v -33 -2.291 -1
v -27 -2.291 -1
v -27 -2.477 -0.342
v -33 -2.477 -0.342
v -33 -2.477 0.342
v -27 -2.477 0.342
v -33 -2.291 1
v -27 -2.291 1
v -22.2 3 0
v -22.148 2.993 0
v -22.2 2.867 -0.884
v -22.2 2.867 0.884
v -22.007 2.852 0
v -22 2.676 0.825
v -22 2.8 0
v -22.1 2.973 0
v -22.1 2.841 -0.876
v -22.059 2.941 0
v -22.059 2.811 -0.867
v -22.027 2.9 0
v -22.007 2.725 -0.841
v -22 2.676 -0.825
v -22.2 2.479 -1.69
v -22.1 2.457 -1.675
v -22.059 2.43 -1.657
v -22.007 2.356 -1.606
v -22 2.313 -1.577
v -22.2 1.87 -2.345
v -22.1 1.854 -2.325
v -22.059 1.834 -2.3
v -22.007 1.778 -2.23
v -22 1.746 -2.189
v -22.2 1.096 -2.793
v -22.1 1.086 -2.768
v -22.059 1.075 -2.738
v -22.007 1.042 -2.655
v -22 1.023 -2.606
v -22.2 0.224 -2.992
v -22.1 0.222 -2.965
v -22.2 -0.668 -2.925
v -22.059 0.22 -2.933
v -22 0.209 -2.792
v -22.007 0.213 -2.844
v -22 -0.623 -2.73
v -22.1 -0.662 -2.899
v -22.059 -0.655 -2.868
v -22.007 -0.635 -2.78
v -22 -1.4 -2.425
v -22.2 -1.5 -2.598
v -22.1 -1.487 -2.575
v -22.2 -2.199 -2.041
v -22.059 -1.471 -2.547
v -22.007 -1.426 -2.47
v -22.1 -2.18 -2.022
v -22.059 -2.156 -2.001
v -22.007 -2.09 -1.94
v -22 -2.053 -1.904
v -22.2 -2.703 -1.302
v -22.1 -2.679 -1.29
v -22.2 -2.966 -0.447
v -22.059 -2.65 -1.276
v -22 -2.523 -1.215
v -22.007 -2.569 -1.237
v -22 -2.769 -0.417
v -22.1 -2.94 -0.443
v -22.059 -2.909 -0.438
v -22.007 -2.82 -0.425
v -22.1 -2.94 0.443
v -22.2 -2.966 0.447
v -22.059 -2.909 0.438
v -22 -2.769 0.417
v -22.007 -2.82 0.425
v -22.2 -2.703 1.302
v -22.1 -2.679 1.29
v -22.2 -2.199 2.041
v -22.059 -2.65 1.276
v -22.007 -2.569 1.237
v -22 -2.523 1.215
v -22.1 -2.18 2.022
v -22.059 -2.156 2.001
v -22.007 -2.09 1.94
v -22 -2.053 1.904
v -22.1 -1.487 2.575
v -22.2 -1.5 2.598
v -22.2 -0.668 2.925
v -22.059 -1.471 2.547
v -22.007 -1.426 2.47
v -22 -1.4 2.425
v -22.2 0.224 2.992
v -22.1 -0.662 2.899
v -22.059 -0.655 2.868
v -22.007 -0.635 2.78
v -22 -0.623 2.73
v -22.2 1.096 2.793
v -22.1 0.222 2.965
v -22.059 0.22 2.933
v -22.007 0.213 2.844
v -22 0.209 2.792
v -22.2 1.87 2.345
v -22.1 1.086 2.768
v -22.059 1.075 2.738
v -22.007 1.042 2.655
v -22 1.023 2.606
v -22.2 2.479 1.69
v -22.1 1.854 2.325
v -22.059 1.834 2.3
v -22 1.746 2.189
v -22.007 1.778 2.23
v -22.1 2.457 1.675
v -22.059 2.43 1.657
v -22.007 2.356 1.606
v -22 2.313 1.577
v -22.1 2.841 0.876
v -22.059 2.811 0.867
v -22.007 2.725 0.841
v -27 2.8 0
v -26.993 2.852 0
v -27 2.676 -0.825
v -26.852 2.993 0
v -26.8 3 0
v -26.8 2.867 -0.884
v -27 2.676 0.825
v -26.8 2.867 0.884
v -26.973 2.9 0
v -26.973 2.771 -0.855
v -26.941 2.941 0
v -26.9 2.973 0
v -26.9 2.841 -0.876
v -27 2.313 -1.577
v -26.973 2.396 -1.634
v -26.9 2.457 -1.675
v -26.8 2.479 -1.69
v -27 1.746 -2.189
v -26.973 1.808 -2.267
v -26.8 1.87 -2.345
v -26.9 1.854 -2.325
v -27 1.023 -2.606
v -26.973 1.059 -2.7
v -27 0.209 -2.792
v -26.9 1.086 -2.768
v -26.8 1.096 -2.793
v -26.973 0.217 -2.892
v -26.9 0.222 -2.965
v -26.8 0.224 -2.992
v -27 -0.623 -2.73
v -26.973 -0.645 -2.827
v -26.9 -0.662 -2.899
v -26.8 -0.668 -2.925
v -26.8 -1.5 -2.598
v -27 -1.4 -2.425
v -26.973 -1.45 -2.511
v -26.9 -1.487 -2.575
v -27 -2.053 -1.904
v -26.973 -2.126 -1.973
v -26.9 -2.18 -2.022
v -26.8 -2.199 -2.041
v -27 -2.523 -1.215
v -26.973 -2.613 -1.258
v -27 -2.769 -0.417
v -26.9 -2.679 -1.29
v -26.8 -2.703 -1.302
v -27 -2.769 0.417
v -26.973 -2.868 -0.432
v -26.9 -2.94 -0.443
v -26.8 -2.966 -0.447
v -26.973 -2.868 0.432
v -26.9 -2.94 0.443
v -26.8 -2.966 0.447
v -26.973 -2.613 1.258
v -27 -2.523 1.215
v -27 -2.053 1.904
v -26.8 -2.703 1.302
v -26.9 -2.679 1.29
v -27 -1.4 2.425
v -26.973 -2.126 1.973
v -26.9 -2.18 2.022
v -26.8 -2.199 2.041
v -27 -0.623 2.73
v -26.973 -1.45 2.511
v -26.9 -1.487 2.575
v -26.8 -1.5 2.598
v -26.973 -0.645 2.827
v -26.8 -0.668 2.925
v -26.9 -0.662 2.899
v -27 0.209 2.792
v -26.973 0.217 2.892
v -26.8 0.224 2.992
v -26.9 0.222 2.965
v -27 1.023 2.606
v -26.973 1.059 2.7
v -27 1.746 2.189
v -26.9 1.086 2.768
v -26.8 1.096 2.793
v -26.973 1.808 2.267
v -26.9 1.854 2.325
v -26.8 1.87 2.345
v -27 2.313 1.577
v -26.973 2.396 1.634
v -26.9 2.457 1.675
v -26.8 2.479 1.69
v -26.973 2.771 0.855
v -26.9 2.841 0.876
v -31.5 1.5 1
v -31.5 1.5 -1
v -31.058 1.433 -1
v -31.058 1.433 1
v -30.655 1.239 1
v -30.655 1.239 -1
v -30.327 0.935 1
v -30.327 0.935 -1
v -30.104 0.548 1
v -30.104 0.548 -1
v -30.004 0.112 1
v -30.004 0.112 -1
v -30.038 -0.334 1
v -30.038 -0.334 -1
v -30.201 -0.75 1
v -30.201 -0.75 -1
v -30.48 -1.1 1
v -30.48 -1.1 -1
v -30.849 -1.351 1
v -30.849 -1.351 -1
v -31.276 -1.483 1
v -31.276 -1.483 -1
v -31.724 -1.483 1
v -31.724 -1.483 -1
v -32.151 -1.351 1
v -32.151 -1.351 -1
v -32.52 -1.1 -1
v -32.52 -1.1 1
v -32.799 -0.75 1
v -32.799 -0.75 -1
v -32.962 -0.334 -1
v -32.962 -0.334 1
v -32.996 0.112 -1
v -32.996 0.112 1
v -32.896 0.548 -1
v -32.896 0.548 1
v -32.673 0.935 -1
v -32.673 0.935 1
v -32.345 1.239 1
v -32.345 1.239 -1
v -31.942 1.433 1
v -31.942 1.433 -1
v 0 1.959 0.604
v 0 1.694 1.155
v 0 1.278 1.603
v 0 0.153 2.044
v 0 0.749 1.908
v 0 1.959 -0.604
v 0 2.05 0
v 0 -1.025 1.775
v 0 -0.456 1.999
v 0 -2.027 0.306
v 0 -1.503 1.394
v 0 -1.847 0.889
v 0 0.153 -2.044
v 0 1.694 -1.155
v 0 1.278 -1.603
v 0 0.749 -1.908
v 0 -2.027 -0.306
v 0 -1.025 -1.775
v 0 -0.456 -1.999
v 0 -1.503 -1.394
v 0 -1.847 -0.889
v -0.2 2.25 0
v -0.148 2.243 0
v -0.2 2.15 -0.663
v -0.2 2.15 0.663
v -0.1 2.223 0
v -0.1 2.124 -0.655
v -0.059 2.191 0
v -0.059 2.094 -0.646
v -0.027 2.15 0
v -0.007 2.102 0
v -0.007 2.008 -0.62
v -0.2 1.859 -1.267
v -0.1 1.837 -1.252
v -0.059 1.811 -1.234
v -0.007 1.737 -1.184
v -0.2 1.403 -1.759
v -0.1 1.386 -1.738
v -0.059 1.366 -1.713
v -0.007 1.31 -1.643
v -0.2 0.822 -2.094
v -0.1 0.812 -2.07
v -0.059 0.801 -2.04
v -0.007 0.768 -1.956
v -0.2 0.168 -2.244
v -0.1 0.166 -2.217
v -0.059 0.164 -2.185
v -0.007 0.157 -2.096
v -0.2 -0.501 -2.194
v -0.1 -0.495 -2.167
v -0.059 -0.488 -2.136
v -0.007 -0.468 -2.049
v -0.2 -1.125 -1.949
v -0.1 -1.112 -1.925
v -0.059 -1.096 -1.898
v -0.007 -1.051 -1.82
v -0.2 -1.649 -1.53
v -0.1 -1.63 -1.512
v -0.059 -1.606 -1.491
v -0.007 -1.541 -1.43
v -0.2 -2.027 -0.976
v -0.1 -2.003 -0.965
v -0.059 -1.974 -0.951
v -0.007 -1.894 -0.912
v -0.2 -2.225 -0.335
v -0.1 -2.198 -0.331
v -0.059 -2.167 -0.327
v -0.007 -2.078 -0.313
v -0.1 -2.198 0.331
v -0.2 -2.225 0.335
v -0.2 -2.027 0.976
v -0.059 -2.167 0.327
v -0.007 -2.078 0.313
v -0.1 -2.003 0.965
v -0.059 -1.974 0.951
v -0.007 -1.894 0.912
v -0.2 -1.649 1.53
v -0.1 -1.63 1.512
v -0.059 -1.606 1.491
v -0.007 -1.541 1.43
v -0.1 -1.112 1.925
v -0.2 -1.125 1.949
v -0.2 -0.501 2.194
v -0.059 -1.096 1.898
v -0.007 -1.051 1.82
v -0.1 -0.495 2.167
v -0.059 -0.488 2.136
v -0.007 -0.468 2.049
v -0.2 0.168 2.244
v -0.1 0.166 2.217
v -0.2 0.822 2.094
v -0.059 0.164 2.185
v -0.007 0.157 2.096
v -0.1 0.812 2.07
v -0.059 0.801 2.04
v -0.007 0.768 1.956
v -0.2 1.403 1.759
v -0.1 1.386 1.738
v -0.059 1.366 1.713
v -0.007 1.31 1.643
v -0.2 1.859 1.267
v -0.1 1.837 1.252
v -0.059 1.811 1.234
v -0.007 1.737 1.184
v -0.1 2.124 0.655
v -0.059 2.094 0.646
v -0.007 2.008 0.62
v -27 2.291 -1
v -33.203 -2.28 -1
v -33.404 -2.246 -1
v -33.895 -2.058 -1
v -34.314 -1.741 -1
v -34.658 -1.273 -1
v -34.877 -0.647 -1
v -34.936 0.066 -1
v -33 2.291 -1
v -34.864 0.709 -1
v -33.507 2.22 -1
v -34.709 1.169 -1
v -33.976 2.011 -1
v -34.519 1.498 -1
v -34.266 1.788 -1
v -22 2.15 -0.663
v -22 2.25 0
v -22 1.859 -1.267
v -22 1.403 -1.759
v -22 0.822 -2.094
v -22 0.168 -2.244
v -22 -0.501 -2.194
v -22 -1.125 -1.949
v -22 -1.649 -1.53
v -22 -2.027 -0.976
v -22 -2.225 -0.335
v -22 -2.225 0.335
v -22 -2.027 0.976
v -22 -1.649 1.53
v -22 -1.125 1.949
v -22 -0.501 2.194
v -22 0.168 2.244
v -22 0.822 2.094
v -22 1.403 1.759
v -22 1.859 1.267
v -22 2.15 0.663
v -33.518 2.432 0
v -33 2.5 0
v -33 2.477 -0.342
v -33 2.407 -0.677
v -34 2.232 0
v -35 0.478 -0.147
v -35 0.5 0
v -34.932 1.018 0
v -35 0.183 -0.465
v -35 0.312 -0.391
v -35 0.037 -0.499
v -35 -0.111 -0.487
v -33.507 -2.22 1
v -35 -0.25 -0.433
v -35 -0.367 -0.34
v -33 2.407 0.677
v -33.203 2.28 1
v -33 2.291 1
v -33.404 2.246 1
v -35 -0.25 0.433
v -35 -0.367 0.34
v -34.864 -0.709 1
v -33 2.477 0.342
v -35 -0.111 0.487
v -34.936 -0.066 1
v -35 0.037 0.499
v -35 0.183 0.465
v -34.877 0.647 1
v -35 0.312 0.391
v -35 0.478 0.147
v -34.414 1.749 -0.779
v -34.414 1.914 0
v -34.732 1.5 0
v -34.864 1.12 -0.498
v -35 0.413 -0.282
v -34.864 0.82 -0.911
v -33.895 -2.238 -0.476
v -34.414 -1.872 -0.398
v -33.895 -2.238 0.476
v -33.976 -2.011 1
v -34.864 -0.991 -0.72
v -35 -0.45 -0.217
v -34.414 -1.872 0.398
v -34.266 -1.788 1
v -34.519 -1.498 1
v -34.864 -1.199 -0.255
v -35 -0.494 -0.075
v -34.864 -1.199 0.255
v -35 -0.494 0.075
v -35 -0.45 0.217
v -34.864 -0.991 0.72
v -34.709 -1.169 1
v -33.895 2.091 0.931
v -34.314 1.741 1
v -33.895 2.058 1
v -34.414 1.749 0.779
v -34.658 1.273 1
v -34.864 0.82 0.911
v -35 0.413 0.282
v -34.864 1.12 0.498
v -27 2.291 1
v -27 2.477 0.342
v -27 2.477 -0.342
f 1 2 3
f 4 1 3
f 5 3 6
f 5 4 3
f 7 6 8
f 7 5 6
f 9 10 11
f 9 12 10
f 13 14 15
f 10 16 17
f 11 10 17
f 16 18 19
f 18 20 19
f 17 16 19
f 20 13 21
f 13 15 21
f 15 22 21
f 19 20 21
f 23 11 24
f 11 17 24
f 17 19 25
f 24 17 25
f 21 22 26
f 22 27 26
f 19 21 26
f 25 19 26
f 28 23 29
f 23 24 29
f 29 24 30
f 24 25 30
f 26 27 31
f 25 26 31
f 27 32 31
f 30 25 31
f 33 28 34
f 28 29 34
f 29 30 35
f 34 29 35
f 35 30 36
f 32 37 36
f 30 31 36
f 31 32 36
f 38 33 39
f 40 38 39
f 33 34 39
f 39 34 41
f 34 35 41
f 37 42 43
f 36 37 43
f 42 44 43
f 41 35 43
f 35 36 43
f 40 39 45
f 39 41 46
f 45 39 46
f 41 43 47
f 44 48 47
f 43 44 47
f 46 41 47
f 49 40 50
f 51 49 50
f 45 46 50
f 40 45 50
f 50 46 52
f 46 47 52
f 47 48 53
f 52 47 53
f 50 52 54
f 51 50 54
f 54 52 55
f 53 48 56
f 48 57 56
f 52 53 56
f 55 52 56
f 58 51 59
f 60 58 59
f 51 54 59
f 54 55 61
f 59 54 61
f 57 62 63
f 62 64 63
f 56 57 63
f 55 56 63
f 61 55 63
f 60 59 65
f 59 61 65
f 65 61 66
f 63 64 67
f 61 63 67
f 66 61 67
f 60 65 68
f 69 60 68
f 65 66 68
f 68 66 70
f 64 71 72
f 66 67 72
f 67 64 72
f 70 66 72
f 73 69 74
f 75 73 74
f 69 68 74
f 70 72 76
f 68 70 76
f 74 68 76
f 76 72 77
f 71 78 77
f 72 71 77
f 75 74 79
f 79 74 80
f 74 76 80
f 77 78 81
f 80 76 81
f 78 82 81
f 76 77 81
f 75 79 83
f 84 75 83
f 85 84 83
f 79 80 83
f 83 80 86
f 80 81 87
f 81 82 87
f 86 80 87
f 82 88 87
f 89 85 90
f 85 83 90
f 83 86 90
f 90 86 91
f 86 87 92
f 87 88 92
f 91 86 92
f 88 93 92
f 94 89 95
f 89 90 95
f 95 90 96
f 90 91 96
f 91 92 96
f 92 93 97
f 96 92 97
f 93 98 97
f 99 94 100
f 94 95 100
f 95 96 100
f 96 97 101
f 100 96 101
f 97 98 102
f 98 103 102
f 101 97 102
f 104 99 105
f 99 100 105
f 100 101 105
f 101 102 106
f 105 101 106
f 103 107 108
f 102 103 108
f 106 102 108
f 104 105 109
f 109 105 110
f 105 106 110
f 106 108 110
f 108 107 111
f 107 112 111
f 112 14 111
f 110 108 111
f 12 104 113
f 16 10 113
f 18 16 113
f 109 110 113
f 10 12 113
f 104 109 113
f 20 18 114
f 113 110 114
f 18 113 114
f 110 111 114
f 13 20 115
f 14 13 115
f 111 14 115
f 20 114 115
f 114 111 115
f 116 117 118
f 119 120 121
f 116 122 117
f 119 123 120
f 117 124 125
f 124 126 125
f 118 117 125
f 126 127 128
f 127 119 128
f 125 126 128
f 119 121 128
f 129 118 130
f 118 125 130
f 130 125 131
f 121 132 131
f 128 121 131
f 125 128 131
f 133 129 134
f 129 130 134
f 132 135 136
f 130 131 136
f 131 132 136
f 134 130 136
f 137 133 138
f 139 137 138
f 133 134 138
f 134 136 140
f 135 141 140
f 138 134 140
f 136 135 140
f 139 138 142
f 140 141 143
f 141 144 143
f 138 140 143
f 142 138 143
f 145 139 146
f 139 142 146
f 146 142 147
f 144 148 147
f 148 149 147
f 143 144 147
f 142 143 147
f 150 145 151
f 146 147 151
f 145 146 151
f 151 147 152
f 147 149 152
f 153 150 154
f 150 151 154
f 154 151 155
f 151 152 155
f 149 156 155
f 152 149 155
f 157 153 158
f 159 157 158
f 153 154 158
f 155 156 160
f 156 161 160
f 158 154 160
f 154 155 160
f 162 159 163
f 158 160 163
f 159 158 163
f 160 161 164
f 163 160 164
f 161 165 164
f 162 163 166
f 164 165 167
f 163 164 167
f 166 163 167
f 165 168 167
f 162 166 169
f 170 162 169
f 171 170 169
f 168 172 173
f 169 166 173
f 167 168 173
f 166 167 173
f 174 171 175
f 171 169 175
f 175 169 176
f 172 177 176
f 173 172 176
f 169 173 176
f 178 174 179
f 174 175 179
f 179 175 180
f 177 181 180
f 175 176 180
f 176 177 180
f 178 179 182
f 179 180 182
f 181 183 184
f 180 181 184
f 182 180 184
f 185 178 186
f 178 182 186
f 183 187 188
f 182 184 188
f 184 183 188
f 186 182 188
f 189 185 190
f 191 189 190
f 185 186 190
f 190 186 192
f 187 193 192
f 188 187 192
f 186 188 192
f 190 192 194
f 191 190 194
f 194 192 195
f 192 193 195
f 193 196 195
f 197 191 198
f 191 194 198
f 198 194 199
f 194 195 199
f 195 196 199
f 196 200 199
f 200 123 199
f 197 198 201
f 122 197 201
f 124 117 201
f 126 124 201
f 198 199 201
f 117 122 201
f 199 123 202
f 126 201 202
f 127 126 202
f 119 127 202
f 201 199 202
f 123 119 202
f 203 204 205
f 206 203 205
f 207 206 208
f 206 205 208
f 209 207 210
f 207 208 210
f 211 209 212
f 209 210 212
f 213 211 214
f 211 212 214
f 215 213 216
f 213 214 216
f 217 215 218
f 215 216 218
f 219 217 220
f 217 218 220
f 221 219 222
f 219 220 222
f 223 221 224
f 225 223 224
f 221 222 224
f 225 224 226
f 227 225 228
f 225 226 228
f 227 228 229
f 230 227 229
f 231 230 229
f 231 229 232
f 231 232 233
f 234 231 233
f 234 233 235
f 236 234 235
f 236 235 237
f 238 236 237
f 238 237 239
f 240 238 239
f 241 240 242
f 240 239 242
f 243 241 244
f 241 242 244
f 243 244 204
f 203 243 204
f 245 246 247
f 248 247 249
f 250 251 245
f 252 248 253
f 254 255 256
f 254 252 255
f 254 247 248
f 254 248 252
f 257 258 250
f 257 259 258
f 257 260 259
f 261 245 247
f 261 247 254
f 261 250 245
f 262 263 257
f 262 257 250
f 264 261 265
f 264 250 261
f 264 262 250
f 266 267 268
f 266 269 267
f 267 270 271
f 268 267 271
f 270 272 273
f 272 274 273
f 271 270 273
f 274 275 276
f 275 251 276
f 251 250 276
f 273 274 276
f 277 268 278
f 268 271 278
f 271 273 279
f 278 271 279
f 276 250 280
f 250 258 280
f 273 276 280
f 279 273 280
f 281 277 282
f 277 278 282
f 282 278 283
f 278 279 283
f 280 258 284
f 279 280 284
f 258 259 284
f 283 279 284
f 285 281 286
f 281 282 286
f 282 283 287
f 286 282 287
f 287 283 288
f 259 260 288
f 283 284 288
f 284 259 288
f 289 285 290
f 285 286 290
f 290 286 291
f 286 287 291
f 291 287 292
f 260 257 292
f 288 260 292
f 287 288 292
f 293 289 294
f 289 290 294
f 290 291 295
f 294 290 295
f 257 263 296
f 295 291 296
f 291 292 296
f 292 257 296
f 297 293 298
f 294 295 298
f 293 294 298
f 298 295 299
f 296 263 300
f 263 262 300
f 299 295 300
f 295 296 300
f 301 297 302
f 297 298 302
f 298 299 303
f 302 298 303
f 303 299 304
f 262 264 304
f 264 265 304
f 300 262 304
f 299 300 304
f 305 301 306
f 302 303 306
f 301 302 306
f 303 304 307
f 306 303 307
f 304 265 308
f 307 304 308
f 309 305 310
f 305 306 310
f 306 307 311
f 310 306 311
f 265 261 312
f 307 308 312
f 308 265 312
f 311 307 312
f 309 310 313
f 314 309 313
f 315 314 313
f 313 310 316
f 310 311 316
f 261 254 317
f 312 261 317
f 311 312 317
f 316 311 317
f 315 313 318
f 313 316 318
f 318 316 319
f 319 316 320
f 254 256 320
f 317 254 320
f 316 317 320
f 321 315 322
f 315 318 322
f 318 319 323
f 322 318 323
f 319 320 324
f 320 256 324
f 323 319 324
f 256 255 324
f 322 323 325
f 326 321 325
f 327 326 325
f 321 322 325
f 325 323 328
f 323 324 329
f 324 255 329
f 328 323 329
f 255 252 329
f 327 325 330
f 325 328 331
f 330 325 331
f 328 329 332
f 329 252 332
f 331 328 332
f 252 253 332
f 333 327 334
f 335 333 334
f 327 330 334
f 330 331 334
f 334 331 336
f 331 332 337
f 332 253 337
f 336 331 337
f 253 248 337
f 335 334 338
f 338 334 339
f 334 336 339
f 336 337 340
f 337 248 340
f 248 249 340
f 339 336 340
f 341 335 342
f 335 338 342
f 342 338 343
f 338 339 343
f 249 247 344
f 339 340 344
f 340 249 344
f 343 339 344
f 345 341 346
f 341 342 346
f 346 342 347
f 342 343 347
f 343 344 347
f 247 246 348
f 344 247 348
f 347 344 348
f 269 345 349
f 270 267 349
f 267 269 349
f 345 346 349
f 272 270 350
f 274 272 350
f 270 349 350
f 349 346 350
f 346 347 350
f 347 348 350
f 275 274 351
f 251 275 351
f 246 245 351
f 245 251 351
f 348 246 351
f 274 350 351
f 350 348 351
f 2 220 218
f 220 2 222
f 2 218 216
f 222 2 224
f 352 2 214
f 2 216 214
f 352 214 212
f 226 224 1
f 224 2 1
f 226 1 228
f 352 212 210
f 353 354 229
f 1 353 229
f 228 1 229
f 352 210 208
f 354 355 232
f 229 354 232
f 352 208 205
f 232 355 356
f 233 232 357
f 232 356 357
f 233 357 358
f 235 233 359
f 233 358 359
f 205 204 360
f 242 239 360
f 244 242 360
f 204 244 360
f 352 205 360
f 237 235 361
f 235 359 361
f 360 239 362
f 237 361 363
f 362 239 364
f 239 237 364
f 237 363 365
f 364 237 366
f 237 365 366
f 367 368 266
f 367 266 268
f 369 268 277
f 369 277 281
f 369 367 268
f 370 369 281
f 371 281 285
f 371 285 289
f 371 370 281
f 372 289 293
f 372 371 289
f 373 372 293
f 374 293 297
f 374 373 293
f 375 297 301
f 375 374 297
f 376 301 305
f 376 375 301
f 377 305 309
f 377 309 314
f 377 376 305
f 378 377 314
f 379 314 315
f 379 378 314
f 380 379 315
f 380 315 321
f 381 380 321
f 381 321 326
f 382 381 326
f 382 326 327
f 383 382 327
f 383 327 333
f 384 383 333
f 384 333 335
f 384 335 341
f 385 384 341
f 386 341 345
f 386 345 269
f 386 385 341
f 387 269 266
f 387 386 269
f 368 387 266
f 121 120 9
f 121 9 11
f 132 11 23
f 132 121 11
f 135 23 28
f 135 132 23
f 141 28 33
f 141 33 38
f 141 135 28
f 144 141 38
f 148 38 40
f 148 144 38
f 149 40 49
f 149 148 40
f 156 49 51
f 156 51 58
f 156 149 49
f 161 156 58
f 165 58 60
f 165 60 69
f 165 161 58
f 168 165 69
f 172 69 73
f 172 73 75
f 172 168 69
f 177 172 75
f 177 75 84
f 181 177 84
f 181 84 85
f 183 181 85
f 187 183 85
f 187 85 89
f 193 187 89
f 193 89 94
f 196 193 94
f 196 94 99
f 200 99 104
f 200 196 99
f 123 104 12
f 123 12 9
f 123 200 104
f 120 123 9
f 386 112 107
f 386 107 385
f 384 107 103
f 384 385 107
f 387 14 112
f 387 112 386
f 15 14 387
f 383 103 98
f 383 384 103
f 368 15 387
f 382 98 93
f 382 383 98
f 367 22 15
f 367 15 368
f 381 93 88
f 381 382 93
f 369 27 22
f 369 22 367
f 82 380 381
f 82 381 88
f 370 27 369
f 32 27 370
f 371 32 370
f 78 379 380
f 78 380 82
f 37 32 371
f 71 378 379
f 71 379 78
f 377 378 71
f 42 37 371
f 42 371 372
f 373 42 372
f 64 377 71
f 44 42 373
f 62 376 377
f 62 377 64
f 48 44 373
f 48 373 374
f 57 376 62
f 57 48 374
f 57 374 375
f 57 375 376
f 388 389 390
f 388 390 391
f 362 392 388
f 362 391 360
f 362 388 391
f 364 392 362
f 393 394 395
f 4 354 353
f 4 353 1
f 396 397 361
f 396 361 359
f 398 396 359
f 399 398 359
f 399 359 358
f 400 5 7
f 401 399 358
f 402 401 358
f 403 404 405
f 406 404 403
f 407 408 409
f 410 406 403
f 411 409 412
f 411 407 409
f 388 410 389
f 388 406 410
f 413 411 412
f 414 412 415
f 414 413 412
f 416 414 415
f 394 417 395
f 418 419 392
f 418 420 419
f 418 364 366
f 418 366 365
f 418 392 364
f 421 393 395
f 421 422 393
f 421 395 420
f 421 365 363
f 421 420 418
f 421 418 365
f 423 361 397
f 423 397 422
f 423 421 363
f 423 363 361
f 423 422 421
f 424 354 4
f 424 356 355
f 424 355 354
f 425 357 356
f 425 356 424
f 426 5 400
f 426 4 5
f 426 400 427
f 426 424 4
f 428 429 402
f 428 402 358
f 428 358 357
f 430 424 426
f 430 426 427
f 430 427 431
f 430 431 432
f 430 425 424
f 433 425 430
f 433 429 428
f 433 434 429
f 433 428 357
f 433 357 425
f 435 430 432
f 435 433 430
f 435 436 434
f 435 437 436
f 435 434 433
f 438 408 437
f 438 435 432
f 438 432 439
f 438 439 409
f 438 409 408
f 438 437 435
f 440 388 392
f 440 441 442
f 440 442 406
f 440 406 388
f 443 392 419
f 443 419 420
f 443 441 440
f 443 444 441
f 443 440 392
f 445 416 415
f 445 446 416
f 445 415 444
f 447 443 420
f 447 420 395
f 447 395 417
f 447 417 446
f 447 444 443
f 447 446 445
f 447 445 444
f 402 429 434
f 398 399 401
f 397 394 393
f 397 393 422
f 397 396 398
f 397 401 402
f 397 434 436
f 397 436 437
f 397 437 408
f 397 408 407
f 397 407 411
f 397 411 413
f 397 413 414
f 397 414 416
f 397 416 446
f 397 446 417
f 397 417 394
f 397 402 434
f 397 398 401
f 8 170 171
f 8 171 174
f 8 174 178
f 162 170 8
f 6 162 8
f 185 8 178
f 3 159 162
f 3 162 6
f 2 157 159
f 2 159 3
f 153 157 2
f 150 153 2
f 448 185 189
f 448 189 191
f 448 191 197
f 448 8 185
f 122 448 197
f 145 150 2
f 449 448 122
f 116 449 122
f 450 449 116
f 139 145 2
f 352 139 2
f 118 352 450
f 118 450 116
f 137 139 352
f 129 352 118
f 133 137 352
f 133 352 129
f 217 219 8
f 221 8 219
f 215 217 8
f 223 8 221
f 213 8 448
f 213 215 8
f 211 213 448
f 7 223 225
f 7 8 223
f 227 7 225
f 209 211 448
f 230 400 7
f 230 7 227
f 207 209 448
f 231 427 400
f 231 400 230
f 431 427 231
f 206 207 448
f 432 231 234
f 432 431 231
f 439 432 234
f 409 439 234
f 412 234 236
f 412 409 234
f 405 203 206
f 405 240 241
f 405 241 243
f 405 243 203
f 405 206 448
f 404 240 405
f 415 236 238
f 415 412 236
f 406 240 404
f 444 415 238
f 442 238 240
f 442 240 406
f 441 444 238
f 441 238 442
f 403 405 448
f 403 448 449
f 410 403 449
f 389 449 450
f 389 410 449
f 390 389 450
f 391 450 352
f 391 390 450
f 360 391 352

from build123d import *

# Parameters (mm, degrees)
FILLET_1_R          = 2
SKETCH_2_R          = 7.321356554
SKETCH_2_W          = 2
SKETCH_2_H          = 11.961651185
CUT_EXTRUDE_1_DEPTH = 8
SKETCH_3_R          = 1.5
CUT_EXTRUDE_2_DEPTH = 2
FILLET_2_R          = 0.2


with BuildPart() as part:
    # 草图1 → 旋转1 (revolve)
    with BuildSketch(Plane.XY):
        Polygon((0, 0), (0, 2.25), (-22, 2.25), (-22, 3), (-27, 3), (-27, 2.5), (-35, 2.5), (-35, 0), align=None)
    revolve(axis=Axis((0, 0, 0), (-1, 0, 0)))

    # 圆角1
    fillet_1_edges = [part.edges().sort_by_distance(p)[0] for p in [
        (-35, -2.5, 0),
    ]]
    fillet(fillet_1_edges, radius=FILLET_1_R)

    # 草图2 → 切除-拉伸1 (cut)
    with BuildSketch(Plane.ZY.offset(35)):
        Circle(SKETCH_2_R)
        with Locations((0, -0.178000761)):
            Rectangle(SKETCH_2_W, SKETCH_2_H, mode=Mode.SUBTRACT)
    extrude(amount=-CUT_EXTRUDE_1_DEPTH, mode=Mode.SUBTRACT)

    # 草图3 → 切除-拉伸2 (cut)
    with BuildSketch(Plane(origin=(0, 0, -1), x_dir=(-1, 0, 0), z_dir=(0, 0, -1))):
        with Locations(Location((31.5, 0, 0), (0, 0, 90))):
            Circle(SKETCH_3_R)
    extrude(amount=-CUT_EXTRUDE_2_DEPTH, mode=Mode.SUBTRACT)

    # 圆角2
    fillet_2_edges = [part.edges().sort_by_distance(p)[0] for p in [
        (-27, -3, 0),
        (-22, -3, 0),
        (0, -2.25, 0),
    ]]
    fillet(fillet_2_edges, radius=FILLET_2_R)


solid = part.part
